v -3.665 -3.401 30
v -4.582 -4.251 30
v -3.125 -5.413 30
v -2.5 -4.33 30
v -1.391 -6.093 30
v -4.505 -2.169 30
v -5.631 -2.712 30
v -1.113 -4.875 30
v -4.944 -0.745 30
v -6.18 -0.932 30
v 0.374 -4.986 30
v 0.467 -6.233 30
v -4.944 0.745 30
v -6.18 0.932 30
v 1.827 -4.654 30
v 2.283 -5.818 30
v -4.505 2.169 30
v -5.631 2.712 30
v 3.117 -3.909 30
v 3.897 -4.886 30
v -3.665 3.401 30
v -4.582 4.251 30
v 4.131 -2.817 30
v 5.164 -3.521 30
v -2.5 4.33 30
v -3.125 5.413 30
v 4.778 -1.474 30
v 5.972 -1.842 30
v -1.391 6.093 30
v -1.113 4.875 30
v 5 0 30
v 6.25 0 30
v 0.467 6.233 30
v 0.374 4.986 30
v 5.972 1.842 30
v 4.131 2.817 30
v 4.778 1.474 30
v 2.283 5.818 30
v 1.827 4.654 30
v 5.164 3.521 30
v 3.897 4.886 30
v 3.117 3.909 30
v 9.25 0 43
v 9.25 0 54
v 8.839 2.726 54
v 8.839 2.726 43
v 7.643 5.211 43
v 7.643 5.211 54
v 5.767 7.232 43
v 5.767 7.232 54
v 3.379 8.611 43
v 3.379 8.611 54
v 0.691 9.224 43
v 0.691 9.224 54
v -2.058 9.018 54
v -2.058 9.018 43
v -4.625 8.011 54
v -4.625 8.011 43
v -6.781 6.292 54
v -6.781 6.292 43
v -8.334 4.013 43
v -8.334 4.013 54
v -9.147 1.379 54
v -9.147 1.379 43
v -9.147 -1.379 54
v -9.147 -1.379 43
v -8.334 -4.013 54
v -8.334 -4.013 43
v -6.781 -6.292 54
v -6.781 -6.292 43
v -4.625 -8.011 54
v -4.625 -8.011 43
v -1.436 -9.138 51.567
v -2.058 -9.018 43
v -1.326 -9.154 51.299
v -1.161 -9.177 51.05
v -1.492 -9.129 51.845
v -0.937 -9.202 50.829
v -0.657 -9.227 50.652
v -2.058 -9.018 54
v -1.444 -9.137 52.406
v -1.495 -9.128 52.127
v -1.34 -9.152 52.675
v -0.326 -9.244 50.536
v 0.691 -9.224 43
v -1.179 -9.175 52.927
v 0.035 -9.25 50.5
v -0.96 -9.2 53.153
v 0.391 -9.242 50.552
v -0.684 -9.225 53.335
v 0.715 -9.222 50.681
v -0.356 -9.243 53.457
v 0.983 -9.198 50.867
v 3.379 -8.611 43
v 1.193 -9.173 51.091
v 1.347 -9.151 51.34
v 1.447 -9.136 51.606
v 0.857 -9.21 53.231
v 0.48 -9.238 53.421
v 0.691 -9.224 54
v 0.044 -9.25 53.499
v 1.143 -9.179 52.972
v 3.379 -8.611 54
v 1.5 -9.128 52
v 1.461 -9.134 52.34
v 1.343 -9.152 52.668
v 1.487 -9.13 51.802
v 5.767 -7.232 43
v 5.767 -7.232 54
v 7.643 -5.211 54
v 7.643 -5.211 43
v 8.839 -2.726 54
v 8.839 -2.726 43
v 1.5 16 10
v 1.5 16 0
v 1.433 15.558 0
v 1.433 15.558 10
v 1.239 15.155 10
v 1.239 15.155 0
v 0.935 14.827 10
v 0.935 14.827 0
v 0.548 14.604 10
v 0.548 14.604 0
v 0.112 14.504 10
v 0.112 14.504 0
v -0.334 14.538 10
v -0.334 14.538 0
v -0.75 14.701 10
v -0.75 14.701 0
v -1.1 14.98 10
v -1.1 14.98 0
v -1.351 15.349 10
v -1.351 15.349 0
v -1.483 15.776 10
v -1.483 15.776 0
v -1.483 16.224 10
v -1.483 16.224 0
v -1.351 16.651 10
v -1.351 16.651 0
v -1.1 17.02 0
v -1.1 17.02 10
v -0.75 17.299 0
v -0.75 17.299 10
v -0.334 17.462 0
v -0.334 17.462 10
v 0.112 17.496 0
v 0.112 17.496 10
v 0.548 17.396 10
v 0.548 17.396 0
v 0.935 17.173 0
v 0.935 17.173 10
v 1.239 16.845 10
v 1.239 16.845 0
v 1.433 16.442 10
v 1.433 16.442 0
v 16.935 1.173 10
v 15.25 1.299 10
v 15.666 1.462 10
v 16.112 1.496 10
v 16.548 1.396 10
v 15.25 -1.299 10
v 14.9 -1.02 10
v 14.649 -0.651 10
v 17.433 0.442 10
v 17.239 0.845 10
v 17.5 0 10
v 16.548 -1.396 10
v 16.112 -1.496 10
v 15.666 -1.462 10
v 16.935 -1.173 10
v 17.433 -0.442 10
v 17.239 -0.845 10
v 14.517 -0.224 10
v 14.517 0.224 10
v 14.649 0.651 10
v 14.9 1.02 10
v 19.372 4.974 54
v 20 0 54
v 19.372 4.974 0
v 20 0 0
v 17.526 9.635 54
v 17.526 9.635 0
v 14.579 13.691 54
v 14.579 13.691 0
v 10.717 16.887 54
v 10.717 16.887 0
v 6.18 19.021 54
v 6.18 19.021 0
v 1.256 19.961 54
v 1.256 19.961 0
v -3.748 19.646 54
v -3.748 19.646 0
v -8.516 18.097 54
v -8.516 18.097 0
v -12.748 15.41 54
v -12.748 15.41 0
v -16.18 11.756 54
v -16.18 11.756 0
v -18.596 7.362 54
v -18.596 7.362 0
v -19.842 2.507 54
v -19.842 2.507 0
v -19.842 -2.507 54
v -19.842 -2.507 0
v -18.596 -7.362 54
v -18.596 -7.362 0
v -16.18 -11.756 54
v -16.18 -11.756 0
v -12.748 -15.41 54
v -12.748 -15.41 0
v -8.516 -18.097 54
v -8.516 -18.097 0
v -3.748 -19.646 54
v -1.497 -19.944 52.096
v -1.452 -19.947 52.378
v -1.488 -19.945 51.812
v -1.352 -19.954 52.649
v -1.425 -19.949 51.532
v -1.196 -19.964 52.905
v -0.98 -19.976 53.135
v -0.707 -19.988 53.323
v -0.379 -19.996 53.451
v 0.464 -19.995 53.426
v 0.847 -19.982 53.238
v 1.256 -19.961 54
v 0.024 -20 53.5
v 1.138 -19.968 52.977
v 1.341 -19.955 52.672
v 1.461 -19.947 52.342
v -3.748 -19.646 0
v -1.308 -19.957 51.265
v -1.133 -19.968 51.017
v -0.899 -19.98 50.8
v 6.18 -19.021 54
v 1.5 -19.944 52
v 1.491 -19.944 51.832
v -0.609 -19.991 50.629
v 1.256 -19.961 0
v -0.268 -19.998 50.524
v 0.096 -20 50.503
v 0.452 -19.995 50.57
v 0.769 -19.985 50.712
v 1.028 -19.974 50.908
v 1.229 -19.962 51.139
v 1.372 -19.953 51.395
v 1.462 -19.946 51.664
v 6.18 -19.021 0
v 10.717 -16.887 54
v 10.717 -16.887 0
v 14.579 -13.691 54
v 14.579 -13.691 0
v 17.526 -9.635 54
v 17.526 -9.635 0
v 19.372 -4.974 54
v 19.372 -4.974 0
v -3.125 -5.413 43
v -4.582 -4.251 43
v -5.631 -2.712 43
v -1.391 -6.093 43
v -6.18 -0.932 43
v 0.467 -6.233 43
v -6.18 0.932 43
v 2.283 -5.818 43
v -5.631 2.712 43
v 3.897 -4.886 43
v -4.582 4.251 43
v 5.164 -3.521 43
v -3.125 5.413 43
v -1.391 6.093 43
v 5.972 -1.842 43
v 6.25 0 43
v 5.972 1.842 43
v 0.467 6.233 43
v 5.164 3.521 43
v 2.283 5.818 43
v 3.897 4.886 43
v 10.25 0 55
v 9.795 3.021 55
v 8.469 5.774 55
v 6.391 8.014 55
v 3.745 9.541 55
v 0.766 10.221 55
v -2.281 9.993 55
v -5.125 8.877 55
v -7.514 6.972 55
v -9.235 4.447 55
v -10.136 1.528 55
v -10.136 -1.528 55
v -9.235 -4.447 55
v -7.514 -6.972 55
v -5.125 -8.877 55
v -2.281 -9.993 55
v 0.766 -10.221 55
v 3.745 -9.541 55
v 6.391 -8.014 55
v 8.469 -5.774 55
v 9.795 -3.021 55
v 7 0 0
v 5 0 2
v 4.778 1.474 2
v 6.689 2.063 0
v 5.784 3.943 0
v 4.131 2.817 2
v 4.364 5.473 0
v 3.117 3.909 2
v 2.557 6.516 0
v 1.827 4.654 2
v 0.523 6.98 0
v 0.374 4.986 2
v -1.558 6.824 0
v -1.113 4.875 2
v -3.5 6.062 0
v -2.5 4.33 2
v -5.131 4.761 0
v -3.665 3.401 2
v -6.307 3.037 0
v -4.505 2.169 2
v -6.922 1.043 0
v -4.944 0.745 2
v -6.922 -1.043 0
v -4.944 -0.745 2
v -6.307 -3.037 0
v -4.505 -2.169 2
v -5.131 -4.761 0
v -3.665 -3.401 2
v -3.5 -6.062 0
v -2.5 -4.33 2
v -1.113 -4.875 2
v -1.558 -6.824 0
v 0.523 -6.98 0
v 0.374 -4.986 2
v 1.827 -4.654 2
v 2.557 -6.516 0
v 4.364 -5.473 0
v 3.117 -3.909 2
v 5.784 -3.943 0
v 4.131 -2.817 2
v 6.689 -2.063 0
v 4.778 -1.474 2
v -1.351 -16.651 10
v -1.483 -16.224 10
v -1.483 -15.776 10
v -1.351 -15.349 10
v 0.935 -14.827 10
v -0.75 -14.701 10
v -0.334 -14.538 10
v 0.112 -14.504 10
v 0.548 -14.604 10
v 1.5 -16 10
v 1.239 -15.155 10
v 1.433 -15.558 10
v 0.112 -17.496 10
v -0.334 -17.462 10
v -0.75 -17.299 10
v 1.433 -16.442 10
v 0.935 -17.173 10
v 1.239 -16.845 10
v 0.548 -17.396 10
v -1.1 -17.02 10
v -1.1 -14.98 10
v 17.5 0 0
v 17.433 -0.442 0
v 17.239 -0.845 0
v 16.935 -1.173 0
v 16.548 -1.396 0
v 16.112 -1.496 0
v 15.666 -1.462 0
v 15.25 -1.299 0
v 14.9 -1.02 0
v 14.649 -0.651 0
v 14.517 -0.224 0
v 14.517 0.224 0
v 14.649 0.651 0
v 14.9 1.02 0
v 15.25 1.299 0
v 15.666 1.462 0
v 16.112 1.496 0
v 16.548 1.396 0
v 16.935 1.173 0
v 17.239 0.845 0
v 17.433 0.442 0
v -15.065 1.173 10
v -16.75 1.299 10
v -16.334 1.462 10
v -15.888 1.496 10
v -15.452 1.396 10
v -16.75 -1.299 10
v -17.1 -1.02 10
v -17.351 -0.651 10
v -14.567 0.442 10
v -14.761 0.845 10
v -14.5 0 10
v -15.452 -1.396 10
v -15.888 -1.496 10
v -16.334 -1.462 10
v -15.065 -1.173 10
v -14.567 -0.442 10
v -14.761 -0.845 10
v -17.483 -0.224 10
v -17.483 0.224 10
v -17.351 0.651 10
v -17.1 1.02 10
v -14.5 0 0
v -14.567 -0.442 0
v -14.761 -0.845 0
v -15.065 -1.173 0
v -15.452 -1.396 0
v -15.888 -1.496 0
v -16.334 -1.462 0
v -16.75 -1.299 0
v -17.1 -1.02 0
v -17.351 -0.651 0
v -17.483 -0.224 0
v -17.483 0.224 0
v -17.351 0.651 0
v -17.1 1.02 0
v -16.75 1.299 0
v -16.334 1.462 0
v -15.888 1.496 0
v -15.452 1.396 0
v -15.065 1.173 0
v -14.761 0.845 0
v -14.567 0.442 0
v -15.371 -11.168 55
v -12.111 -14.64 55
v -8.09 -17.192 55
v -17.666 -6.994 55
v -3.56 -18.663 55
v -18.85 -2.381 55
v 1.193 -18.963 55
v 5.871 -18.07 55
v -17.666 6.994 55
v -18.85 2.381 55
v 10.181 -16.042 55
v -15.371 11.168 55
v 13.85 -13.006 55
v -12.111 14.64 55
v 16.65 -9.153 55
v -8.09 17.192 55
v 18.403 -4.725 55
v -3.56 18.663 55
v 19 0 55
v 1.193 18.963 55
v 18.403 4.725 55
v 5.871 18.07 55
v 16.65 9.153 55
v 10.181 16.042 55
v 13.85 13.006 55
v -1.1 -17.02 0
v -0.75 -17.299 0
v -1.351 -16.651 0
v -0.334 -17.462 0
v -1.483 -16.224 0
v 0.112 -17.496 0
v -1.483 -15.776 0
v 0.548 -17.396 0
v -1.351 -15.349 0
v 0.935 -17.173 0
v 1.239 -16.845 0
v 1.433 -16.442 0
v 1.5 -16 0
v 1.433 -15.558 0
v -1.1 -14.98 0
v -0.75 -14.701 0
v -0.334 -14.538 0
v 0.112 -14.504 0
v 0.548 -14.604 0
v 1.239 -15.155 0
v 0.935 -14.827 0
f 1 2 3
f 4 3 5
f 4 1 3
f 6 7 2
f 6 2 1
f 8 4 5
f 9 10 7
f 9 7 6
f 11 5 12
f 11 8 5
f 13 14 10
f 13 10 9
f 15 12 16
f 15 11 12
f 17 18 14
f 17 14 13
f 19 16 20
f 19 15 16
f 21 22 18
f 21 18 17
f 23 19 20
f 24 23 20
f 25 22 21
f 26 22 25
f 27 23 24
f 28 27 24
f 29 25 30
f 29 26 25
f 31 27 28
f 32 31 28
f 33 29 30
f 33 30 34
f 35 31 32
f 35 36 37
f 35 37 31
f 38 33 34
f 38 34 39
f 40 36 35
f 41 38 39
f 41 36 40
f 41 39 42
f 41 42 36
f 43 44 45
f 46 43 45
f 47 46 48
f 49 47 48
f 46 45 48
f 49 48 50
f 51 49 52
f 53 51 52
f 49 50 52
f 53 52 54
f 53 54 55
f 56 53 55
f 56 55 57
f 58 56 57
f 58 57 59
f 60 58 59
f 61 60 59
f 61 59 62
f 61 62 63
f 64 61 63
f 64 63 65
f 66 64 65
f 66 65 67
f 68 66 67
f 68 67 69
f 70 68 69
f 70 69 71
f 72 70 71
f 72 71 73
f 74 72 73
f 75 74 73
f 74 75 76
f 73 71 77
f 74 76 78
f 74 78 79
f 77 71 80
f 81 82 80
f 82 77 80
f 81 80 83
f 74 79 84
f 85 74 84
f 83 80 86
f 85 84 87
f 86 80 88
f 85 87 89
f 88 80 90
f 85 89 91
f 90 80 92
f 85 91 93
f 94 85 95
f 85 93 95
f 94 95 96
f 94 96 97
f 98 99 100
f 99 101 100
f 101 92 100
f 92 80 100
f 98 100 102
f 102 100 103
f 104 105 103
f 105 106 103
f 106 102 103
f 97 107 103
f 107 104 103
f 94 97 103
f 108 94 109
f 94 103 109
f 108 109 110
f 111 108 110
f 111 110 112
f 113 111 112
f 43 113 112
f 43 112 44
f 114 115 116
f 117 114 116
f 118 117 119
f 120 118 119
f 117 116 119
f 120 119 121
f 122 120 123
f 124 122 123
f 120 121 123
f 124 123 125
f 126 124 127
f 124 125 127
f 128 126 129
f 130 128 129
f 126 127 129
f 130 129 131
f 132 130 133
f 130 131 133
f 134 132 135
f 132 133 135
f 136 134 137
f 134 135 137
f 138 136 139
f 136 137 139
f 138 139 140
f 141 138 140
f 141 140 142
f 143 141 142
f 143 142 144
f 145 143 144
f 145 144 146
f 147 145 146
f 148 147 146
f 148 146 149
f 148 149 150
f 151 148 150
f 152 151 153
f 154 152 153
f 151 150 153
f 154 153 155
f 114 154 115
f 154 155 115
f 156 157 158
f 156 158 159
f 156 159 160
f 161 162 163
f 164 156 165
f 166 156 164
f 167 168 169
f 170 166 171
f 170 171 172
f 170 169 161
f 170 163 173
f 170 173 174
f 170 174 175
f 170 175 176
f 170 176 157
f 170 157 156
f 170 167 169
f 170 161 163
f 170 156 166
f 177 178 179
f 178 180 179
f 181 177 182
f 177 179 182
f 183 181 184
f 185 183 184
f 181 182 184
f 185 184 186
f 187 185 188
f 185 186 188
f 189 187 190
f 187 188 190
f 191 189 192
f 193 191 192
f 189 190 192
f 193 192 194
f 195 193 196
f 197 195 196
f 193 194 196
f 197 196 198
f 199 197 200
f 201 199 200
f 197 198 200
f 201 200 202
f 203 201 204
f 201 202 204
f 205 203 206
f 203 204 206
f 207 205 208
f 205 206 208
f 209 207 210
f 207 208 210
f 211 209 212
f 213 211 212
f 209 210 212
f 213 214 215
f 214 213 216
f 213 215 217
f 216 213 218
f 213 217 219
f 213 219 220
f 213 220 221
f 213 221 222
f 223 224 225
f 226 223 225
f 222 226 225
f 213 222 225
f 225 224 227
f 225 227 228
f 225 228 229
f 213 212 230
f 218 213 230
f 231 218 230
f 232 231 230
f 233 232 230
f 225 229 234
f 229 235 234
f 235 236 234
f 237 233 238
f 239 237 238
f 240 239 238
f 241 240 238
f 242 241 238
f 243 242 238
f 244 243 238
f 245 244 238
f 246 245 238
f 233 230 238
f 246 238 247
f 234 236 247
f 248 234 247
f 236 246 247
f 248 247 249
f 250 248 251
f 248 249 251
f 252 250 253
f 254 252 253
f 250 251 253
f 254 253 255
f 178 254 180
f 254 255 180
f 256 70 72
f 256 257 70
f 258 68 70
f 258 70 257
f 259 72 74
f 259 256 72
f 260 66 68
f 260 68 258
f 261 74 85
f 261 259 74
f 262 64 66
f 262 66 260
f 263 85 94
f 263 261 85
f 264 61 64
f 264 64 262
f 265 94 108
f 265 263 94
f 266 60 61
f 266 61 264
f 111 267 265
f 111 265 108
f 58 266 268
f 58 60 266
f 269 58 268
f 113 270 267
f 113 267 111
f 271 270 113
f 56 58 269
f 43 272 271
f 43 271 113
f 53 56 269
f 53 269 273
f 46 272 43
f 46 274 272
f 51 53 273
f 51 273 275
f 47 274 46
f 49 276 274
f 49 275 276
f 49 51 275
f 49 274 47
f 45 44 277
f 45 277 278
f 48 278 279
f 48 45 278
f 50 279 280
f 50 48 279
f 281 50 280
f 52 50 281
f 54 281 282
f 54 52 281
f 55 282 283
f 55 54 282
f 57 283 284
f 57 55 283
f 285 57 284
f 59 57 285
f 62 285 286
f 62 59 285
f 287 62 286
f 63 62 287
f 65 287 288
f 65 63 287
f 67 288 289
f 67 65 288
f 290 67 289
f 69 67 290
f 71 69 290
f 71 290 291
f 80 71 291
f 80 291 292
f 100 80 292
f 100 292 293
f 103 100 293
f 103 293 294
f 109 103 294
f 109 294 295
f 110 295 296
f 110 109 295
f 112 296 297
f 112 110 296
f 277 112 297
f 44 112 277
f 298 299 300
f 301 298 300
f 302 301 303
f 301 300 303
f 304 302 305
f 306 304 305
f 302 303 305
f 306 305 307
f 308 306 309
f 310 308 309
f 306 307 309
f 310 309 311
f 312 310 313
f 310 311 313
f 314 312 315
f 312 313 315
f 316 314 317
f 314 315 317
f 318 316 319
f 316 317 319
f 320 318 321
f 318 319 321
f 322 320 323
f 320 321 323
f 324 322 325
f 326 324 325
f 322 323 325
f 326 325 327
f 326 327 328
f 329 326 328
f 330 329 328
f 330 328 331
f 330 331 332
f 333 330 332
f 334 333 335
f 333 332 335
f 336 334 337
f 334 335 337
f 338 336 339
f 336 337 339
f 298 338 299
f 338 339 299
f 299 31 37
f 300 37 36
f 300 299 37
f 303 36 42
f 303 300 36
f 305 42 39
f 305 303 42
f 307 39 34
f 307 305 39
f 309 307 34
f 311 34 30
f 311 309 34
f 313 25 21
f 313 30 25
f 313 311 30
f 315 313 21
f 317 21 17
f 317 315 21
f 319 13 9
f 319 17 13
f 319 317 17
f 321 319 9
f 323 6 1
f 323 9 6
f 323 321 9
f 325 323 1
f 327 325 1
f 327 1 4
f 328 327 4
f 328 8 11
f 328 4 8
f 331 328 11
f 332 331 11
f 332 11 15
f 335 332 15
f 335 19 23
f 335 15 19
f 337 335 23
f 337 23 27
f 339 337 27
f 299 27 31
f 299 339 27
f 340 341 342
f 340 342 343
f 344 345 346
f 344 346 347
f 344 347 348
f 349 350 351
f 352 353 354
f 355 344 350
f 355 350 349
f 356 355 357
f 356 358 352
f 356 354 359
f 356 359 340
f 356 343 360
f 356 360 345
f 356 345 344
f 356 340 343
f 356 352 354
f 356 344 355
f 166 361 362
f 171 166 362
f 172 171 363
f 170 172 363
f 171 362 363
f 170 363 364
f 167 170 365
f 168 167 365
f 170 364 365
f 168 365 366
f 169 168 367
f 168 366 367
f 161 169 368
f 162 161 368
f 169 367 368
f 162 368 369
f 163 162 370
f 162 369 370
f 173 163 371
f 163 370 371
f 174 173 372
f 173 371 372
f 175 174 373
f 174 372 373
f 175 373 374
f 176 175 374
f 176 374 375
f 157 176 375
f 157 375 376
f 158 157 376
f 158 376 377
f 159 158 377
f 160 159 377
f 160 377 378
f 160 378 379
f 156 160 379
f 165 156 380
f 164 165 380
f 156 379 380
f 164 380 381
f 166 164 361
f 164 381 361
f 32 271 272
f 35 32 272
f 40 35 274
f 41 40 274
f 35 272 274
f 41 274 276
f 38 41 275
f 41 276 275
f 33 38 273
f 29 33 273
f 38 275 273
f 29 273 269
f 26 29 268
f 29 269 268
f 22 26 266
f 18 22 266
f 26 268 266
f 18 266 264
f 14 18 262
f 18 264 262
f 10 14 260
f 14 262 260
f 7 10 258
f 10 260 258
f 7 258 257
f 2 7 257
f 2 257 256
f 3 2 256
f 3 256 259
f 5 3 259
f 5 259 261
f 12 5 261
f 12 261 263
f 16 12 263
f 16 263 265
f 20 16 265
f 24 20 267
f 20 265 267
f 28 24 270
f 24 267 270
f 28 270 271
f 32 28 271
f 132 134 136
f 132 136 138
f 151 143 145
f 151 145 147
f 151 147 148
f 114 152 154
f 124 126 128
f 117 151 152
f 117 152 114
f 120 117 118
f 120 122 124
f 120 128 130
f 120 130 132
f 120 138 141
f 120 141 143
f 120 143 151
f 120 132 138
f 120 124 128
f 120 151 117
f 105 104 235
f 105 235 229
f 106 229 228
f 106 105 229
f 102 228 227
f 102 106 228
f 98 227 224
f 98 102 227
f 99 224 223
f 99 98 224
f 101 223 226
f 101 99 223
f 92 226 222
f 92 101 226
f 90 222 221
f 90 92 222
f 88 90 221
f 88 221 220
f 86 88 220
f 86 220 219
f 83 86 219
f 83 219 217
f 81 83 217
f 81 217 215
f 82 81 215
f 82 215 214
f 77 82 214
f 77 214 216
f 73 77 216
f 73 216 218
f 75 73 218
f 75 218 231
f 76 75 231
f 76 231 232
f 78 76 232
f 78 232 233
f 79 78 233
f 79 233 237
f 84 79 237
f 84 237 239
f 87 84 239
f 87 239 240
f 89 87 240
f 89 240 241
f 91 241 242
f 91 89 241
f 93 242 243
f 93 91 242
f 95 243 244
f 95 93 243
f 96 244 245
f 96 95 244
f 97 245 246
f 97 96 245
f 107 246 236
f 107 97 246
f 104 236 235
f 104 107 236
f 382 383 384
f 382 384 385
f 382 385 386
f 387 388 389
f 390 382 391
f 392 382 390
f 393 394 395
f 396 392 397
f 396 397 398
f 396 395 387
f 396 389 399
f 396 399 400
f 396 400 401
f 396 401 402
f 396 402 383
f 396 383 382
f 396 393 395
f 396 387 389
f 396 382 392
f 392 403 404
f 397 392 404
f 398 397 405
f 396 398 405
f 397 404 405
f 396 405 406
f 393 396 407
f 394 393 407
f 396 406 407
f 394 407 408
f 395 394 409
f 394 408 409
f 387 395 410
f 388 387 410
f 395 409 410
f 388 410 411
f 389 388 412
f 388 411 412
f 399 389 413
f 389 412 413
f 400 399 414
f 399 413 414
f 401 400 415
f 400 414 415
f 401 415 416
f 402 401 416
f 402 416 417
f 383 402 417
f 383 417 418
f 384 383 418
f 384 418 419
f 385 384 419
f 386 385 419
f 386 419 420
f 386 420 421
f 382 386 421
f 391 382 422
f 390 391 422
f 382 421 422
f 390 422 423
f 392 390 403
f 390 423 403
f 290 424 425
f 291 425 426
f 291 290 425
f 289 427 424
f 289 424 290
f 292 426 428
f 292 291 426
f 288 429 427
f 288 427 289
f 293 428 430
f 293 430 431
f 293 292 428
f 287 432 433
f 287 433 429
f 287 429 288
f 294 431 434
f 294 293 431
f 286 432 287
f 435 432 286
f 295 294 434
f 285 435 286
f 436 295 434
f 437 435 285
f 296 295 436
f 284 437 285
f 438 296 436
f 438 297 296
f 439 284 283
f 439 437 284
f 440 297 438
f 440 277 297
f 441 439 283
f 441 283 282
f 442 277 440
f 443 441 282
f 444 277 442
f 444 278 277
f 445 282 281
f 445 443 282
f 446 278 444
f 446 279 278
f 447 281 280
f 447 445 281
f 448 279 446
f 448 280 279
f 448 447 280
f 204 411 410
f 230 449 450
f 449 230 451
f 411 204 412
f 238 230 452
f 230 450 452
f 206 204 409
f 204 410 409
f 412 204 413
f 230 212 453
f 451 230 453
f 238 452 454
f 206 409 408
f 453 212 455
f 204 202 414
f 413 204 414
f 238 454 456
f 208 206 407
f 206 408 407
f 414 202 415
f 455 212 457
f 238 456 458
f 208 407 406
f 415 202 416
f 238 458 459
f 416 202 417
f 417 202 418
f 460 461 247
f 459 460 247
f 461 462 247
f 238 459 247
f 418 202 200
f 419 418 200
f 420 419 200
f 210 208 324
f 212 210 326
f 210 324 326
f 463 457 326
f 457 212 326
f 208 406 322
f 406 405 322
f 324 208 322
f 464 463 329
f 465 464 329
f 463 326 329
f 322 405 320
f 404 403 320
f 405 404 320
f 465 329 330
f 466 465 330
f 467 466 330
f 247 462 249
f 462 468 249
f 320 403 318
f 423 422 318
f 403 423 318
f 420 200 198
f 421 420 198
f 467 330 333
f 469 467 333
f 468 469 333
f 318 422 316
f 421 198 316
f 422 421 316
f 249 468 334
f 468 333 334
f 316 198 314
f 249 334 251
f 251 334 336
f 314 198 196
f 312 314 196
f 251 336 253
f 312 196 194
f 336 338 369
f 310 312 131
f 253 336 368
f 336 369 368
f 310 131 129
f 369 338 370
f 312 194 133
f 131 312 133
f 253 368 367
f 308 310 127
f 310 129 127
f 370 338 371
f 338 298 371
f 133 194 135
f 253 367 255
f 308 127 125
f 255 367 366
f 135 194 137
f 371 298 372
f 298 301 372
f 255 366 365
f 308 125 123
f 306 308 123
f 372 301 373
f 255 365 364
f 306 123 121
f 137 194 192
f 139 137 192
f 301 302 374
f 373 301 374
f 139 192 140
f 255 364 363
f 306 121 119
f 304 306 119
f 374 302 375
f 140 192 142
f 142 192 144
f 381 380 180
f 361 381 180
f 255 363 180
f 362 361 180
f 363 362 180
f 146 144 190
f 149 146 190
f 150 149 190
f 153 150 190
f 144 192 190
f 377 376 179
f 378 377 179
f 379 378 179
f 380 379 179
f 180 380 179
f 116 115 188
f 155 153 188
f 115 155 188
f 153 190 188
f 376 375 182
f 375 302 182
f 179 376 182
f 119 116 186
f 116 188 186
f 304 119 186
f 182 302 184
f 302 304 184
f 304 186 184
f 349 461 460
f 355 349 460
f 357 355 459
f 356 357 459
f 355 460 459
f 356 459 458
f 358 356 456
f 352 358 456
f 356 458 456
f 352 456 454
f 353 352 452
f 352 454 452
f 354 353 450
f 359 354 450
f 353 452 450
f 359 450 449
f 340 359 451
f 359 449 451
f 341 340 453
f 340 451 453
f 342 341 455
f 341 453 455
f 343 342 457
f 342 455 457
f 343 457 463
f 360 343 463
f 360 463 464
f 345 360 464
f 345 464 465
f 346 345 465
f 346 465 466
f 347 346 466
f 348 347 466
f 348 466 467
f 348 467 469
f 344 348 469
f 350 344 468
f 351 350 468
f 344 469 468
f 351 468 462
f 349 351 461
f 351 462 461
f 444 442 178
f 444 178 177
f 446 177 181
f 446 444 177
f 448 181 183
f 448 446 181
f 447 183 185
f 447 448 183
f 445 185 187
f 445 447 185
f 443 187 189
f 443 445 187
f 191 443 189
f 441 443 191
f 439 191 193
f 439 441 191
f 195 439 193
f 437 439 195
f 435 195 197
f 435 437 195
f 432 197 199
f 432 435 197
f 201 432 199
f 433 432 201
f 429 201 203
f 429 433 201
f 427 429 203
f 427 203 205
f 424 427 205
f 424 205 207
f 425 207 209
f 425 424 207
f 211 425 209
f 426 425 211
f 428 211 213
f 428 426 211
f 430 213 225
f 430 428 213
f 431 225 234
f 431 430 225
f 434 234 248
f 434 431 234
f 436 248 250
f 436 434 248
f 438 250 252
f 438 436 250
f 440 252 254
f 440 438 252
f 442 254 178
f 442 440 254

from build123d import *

# Parameters (mm, degrees)
F0_R      = 20
F0_R_2    = 5
F1_DEPTH  = 55
F2_R      = 9.25
F3_DEPTH  = 12
F4_R      = 6.25
F5_DEPTH  = 13
F6_SIZE   = 1
F7_R      = 1.5
F8_DEPTH  = 20.001
F9_SIZE   = 2
F10_R     = 1.5
F11_DEPTH = 10


with BuildPart() as f1:
    # F0 (on Top) → F1 (new body)
    with BuildSketch(Plane.XY):
        Circle(F0_R)
        Circle(F0_R_2, mode=Mode.SUBTRACT)
    extrude(amount=F1_DEPTH)

    # F2 (on face) → F3 (cut)
    with BuildSketch(Plane.XY.offset(55)):
        Circle(F2_R)
    extrude(amount=-F3_DEPTH, mode=Mode.SUBTRACT)

    # F4 (on face) → F5 (cut)
    with BuildSketch(Plane.XY.offset(43)):
        Circle(F4_R)
    extrude(amount=-F5_DEPTH, mode=Mode.SUBTRACT)

    # F6
    f6_edges = [f1.edges().sort_by_distance(p)[0] for p in [
        (-9.25, 0, 55),
        (-20, 0, 55),
    ]]
    chamfer(f6_edges, length=F6_SIZE)

    # F7 (on Front) → F8 (cut, through all)
    with BuildSketch(Plane.XZ):
        with Locations((0, 52)):
            Circle(F7_R)
    extrude(amount=F8_DEPTH, mode=Mode.SUBTRACT)

    # F9
    f9_edges = [f1.edges().sort_by_distance(p)[0] for p in [
        (-5, 0, 0),
    ]]
    chamfer(f9_edges, length=F9_SIZE)

    # F10 (on face) → F11 (cut)
    with BuildSketch(Plane(origin=(0, 0, 0), x_dir=(1, 0, 0), z_dir=(0, 0, -1))):
        with Locations((-16, 0)):
            Circle(F10_R)
        with Locations((0, 16)):
            Circle(F10_R)
        with Locations((16, 0)):
            Circle(F10_R)
        with Locations((0, -16)):
            Circle(F10_R)
    extrude(amount=-F11_DEPTH, mode=Mode.SUBTRACT)


solid = f1.part
